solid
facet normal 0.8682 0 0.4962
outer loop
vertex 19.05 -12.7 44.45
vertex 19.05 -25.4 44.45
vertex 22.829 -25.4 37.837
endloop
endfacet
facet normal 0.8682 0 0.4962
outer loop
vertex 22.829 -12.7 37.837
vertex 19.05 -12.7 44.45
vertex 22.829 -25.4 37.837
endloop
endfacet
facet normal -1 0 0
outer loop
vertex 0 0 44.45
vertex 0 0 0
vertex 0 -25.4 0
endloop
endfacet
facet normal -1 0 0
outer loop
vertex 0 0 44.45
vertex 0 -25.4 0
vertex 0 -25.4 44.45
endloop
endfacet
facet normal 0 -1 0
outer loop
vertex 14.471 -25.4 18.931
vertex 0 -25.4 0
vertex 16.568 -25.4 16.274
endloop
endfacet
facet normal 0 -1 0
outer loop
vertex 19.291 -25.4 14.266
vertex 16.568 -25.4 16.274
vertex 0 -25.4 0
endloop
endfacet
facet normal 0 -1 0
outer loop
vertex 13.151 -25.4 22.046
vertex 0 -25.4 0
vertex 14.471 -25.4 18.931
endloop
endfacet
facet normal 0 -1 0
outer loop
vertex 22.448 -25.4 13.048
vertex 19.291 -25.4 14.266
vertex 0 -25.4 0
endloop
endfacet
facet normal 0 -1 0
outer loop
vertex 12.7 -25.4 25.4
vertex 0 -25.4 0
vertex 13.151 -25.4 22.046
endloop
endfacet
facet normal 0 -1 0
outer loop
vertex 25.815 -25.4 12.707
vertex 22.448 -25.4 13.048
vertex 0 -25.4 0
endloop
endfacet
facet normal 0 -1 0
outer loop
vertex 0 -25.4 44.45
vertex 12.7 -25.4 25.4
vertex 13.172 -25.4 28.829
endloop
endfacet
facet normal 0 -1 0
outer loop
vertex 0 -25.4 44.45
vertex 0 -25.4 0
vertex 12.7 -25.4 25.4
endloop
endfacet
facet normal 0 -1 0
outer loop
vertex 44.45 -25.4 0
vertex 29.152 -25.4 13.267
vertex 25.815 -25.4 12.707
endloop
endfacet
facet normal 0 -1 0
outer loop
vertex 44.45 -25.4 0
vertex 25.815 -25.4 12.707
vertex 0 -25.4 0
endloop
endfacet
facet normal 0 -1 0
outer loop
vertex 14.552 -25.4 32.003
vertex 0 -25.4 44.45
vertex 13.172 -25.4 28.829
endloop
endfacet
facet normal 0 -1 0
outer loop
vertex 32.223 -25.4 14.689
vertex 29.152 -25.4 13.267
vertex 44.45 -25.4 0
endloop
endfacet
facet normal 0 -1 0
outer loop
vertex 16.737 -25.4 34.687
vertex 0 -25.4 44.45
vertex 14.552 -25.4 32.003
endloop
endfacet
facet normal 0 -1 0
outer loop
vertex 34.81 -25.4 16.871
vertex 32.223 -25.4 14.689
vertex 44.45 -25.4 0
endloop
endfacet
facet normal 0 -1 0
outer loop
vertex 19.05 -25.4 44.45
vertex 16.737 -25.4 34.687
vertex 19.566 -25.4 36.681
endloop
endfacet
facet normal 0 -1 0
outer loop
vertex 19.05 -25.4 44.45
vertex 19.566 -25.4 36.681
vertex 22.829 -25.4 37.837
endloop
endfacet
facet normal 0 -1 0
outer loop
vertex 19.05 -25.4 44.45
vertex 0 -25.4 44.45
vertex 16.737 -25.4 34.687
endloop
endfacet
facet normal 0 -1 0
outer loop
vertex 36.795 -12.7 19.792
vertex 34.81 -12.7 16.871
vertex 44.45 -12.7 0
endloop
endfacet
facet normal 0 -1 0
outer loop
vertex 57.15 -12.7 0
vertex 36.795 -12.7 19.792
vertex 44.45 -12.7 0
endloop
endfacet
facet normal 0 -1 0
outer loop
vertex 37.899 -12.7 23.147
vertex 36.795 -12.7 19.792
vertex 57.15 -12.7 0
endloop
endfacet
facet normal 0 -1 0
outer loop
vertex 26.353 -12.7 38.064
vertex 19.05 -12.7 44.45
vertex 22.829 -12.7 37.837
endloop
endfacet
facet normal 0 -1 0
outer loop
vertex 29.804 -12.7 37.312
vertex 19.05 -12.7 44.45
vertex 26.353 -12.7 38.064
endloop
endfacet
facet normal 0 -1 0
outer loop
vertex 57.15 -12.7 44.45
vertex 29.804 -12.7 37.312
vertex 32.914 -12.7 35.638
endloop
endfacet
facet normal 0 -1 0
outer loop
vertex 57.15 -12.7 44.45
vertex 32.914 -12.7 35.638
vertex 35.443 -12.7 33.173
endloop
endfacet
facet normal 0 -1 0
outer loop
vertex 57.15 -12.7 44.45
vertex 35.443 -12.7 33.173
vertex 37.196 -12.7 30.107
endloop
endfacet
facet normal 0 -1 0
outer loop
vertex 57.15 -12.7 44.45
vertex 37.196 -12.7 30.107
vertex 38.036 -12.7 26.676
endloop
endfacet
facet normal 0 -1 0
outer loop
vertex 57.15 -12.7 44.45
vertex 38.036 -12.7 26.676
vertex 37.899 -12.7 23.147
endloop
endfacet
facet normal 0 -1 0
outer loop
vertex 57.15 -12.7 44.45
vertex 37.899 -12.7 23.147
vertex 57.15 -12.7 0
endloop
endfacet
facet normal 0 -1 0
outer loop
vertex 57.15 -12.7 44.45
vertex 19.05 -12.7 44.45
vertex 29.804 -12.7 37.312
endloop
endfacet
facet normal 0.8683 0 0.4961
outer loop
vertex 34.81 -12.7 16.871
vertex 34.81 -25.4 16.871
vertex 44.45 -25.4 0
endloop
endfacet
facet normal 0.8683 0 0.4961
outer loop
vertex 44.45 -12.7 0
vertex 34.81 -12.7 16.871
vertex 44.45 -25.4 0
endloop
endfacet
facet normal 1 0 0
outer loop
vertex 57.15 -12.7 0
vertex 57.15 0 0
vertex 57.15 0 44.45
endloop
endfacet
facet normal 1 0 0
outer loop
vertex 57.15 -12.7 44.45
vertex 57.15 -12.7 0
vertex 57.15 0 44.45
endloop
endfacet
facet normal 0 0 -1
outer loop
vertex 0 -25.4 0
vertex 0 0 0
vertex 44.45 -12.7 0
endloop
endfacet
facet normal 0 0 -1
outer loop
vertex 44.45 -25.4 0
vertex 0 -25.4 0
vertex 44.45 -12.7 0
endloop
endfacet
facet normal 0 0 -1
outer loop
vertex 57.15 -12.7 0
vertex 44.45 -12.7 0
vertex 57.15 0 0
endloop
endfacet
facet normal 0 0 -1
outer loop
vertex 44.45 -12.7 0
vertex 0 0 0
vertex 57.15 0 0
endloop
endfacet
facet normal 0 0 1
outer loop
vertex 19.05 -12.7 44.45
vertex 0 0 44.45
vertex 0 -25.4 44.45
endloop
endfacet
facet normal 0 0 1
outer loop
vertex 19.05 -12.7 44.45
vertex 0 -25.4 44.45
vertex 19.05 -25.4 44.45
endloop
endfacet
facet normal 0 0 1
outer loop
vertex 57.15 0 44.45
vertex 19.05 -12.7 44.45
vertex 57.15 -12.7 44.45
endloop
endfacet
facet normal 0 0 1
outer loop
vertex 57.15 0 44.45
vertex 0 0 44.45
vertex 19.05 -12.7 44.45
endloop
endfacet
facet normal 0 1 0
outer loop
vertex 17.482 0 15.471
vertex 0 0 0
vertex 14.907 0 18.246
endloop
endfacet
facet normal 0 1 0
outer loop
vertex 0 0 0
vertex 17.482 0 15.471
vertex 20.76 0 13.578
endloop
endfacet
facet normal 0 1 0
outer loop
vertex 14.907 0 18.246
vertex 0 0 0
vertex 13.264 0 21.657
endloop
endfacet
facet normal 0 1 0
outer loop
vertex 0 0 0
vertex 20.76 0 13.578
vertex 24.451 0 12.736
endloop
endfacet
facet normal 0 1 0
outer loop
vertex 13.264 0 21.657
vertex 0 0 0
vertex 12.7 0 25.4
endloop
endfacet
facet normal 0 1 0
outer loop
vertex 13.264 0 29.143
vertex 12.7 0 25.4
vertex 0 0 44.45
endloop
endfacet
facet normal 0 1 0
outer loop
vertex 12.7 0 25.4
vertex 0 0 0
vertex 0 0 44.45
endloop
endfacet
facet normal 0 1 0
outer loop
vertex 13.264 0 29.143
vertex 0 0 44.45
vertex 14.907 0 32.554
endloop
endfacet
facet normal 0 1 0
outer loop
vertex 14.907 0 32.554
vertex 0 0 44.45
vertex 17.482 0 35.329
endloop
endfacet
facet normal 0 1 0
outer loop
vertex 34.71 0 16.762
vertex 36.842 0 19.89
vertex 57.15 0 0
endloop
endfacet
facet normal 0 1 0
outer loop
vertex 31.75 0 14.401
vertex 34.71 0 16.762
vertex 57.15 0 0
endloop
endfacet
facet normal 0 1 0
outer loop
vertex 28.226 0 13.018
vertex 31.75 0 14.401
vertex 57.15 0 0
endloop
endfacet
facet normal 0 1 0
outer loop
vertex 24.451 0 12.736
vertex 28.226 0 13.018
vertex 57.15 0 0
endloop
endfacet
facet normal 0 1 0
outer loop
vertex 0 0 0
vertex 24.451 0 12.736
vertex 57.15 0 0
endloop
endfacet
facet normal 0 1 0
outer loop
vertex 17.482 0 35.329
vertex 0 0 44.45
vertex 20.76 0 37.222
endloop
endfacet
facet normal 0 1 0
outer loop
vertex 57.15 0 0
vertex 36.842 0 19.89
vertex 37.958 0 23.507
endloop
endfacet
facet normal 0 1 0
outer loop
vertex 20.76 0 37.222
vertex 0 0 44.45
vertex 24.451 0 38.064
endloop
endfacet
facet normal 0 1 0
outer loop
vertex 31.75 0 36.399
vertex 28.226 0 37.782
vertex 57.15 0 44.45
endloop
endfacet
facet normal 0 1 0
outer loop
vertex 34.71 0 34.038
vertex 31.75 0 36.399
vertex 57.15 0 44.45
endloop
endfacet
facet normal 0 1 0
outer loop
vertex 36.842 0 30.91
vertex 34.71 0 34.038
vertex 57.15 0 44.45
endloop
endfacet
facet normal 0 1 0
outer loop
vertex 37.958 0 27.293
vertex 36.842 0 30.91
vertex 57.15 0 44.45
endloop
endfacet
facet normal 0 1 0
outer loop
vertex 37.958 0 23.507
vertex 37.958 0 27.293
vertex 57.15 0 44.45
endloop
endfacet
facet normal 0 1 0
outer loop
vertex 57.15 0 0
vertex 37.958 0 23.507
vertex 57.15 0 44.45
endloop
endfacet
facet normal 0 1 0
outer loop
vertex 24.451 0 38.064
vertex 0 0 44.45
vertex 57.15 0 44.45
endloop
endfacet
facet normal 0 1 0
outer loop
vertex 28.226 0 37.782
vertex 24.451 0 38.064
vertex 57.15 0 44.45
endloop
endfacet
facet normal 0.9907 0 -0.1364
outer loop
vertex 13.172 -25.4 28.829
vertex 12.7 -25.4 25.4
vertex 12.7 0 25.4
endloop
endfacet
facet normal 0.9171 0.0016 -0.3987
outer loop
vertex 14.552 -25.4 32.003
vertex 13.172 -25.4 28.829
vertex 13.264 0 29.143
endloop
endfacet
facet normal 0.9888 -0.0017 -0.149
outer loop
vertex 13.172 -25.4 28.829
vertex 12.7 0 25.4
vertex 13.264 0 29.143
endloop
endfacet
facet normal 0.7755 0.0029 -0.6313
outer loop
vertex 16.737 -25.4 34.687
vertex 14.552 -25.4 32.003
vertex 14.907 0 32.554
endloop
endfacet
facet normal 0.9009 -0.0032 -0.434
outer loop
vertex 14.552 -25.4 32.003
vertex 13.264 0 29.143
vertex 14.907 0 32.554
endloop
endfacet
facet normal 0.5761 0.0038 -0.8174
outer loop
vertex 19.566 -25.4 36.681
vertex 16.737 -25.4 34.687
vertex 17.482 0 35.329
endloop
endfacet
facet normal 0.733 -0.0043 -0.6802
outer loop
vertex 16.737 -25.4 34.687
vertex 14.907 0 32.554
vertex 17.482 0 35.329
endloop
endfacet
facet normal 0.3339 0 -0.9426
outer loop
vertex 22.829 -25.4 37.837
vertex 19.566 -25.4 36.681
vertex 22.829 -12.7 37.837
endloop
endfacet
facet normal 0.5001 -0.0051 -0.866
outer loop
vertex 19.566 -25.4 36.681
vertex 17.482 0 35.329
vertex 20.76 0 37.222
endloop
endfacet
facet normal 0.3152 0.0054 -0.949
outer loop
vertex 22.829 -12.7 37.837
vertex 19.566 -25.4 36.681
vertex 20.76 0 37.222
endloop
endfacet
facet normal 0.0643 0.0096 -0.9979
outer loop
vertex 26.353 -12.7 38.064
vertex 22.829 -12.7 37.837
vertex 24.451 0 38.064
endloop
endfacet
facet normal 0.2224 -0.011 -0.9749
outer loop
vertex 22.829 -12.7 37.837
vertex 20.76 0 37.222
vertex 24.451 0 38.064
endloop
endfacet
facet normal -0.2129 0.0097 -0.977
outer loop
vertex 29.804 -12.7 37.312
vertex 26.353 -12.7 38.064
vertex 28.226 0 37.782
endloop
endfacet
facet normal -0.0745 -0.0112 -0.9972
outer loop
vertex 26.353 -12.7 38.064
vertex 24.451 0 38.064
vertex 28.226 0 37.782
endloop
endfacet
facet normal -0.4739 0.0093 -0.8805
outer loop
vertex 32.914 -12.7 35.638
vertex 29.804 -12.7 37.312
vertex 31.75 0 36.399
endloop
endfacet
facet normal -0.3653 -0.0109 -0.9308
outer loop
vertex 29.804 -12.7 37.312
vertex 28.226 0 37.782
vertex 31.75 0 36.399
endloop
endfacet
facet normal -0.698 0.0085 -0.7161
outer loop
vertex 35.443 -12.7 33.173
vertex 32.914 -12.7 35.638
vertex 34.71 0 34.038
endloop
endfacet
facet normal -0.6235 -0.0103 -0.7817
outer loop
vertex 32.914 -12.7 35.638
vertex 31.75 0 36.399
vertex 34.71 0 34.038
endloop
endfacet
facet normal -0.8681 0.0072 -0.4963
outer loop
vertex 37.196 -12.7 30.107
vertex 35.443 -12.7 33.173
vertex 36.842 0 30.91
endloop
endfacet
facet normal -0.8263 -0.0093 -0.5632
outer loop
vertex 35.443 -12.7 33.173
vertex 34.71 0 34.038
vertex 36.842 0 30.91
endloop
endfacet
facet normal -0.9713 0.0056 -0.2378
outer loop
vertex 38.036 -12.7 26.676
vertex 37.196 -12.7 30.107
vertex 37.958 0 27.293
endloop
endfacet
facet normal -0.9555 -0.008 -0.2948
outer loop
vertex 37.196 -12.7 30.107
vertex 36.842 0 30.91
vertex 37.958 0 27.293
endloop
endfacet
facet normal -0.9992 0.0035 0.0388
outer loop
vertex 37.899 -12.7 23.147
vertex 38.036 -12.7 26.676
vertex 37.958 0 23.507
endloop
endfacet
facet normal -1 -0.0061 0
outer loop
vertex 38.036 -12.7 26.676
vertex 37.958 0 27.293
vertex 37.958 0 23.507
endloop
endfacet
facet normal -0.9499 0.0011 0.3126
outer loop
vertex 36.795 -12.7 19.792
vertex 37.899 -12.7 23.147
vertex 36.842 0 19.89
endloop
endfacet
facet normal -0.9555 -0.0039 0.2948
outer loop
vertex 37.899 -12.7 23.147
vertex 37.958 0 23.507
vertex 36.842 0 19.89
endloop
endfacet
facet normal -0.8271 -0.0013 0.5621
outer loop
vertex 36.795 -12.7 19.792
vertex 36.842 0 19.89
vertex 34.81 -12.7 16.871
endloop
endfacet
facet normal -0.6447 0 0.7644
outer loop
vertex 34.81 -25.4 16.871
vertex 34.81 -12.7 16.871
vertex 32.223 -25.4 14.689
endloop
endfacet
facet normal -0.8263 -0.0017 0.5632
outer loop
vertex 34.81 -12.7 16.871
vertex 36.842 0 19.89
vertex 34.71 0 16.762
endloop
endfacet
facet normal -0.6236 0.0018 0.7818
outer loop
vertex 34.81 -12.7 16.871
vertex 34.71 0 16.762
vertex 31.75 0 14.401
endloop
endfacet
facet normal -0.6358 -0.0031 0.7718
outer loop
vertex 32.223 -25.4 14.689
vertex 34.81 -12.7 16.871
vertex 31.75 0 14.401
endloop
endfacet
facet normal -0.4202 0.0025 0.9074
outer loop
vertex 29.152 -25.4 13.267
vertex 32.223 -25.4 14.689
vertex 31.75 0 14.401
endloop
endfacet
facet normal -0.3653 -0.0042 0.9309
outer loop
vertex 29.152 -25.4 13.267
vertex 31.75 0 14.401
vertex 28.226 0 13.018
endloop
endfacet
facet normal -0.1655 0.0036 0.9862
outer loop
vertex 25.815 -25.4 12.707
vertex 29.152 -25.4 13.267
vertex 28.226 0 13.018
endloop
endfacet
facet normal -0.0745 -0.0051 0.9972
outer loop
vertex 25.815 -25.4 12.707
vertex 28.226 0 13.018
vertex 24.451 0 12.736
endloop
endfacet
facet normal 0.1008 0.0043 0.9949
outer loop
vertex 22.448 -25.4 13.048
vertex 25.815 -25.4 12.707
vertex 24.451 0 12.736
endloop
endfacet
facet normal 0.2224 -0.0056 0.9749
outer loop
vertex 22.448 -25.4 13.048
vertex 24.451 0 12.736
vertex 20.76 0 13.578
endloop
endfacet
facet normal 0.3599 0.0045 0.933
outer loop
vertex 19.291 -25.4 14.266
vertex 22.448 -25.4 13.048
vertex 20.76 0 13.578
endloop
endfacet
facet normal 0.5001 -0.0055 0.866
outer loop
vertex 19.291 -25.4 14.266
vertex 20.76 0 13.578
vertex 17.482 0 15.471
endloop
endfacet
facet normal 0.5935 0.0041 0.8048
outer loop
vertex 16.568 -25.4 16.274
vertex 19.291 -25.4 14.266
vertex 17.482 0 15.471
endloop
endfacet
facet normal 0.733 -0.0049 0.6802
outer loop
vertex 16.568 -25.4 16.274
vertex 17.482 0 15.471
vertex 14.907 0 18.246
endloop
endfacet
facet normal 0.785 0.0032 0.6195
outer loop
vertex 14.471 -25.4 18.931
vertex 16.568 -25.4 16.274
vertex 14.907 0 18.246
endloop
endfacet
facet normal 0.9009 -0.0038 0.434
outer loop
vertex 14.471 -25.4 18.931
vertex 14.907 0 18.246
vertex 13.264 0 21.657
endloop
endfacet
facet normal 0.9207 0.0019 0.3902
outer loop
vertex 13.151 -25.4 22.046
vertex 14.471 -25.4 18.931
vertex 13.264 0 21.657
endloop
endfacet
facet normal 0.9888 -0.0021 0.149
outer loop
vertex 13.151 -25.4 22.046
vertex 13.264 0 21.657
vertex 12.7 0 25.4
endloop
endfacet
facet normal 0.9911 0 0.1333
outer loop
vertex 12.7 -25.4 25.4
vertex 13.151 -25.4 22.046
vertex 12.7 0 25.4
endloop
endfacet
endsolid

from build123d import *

# Parameters (mm, degrees)
F0_W     = 57.15
F0_H     = 44.45
F1_DEPTH = 25.4
F3_DEPTH = 12.7
F4_R     = 12.7
F5_DEPTH = 25.4


with BuildPart() as f1:
    # F0 (on Front) → F1 (new body)
    with BuildSketch(Plane.XZ):
        with Locations((28.575, 22.225)):
            Rectangle(F0_W, F0_H)
    extrude(amount=F1_DEPTH)

    # F2 (on face) → F3 (cut)
    with BuildSketch(Plane.XZ.offset(25.4)):
        Polygon((57.15, 44.45), (19.05, 44.45), (44.45, 0), (57.15, 0), align=None)
    extrude(amount=-F3_DEPTH, mode=Mode.SUBTRACT)

    # F4 (on face) → F5 (cut)
    with BuildSketch(Plane(origin=(0, 0, 0), x_dir=(-1, 0, 0), z_dir=(0, 1, 0))):
        with Locations((-25.4, 25.4)):
            Circle(F4_R)
    extrude(amount=-F5_DEPTH, mode=Mode.SUBTRACT)


solid = f1.part
